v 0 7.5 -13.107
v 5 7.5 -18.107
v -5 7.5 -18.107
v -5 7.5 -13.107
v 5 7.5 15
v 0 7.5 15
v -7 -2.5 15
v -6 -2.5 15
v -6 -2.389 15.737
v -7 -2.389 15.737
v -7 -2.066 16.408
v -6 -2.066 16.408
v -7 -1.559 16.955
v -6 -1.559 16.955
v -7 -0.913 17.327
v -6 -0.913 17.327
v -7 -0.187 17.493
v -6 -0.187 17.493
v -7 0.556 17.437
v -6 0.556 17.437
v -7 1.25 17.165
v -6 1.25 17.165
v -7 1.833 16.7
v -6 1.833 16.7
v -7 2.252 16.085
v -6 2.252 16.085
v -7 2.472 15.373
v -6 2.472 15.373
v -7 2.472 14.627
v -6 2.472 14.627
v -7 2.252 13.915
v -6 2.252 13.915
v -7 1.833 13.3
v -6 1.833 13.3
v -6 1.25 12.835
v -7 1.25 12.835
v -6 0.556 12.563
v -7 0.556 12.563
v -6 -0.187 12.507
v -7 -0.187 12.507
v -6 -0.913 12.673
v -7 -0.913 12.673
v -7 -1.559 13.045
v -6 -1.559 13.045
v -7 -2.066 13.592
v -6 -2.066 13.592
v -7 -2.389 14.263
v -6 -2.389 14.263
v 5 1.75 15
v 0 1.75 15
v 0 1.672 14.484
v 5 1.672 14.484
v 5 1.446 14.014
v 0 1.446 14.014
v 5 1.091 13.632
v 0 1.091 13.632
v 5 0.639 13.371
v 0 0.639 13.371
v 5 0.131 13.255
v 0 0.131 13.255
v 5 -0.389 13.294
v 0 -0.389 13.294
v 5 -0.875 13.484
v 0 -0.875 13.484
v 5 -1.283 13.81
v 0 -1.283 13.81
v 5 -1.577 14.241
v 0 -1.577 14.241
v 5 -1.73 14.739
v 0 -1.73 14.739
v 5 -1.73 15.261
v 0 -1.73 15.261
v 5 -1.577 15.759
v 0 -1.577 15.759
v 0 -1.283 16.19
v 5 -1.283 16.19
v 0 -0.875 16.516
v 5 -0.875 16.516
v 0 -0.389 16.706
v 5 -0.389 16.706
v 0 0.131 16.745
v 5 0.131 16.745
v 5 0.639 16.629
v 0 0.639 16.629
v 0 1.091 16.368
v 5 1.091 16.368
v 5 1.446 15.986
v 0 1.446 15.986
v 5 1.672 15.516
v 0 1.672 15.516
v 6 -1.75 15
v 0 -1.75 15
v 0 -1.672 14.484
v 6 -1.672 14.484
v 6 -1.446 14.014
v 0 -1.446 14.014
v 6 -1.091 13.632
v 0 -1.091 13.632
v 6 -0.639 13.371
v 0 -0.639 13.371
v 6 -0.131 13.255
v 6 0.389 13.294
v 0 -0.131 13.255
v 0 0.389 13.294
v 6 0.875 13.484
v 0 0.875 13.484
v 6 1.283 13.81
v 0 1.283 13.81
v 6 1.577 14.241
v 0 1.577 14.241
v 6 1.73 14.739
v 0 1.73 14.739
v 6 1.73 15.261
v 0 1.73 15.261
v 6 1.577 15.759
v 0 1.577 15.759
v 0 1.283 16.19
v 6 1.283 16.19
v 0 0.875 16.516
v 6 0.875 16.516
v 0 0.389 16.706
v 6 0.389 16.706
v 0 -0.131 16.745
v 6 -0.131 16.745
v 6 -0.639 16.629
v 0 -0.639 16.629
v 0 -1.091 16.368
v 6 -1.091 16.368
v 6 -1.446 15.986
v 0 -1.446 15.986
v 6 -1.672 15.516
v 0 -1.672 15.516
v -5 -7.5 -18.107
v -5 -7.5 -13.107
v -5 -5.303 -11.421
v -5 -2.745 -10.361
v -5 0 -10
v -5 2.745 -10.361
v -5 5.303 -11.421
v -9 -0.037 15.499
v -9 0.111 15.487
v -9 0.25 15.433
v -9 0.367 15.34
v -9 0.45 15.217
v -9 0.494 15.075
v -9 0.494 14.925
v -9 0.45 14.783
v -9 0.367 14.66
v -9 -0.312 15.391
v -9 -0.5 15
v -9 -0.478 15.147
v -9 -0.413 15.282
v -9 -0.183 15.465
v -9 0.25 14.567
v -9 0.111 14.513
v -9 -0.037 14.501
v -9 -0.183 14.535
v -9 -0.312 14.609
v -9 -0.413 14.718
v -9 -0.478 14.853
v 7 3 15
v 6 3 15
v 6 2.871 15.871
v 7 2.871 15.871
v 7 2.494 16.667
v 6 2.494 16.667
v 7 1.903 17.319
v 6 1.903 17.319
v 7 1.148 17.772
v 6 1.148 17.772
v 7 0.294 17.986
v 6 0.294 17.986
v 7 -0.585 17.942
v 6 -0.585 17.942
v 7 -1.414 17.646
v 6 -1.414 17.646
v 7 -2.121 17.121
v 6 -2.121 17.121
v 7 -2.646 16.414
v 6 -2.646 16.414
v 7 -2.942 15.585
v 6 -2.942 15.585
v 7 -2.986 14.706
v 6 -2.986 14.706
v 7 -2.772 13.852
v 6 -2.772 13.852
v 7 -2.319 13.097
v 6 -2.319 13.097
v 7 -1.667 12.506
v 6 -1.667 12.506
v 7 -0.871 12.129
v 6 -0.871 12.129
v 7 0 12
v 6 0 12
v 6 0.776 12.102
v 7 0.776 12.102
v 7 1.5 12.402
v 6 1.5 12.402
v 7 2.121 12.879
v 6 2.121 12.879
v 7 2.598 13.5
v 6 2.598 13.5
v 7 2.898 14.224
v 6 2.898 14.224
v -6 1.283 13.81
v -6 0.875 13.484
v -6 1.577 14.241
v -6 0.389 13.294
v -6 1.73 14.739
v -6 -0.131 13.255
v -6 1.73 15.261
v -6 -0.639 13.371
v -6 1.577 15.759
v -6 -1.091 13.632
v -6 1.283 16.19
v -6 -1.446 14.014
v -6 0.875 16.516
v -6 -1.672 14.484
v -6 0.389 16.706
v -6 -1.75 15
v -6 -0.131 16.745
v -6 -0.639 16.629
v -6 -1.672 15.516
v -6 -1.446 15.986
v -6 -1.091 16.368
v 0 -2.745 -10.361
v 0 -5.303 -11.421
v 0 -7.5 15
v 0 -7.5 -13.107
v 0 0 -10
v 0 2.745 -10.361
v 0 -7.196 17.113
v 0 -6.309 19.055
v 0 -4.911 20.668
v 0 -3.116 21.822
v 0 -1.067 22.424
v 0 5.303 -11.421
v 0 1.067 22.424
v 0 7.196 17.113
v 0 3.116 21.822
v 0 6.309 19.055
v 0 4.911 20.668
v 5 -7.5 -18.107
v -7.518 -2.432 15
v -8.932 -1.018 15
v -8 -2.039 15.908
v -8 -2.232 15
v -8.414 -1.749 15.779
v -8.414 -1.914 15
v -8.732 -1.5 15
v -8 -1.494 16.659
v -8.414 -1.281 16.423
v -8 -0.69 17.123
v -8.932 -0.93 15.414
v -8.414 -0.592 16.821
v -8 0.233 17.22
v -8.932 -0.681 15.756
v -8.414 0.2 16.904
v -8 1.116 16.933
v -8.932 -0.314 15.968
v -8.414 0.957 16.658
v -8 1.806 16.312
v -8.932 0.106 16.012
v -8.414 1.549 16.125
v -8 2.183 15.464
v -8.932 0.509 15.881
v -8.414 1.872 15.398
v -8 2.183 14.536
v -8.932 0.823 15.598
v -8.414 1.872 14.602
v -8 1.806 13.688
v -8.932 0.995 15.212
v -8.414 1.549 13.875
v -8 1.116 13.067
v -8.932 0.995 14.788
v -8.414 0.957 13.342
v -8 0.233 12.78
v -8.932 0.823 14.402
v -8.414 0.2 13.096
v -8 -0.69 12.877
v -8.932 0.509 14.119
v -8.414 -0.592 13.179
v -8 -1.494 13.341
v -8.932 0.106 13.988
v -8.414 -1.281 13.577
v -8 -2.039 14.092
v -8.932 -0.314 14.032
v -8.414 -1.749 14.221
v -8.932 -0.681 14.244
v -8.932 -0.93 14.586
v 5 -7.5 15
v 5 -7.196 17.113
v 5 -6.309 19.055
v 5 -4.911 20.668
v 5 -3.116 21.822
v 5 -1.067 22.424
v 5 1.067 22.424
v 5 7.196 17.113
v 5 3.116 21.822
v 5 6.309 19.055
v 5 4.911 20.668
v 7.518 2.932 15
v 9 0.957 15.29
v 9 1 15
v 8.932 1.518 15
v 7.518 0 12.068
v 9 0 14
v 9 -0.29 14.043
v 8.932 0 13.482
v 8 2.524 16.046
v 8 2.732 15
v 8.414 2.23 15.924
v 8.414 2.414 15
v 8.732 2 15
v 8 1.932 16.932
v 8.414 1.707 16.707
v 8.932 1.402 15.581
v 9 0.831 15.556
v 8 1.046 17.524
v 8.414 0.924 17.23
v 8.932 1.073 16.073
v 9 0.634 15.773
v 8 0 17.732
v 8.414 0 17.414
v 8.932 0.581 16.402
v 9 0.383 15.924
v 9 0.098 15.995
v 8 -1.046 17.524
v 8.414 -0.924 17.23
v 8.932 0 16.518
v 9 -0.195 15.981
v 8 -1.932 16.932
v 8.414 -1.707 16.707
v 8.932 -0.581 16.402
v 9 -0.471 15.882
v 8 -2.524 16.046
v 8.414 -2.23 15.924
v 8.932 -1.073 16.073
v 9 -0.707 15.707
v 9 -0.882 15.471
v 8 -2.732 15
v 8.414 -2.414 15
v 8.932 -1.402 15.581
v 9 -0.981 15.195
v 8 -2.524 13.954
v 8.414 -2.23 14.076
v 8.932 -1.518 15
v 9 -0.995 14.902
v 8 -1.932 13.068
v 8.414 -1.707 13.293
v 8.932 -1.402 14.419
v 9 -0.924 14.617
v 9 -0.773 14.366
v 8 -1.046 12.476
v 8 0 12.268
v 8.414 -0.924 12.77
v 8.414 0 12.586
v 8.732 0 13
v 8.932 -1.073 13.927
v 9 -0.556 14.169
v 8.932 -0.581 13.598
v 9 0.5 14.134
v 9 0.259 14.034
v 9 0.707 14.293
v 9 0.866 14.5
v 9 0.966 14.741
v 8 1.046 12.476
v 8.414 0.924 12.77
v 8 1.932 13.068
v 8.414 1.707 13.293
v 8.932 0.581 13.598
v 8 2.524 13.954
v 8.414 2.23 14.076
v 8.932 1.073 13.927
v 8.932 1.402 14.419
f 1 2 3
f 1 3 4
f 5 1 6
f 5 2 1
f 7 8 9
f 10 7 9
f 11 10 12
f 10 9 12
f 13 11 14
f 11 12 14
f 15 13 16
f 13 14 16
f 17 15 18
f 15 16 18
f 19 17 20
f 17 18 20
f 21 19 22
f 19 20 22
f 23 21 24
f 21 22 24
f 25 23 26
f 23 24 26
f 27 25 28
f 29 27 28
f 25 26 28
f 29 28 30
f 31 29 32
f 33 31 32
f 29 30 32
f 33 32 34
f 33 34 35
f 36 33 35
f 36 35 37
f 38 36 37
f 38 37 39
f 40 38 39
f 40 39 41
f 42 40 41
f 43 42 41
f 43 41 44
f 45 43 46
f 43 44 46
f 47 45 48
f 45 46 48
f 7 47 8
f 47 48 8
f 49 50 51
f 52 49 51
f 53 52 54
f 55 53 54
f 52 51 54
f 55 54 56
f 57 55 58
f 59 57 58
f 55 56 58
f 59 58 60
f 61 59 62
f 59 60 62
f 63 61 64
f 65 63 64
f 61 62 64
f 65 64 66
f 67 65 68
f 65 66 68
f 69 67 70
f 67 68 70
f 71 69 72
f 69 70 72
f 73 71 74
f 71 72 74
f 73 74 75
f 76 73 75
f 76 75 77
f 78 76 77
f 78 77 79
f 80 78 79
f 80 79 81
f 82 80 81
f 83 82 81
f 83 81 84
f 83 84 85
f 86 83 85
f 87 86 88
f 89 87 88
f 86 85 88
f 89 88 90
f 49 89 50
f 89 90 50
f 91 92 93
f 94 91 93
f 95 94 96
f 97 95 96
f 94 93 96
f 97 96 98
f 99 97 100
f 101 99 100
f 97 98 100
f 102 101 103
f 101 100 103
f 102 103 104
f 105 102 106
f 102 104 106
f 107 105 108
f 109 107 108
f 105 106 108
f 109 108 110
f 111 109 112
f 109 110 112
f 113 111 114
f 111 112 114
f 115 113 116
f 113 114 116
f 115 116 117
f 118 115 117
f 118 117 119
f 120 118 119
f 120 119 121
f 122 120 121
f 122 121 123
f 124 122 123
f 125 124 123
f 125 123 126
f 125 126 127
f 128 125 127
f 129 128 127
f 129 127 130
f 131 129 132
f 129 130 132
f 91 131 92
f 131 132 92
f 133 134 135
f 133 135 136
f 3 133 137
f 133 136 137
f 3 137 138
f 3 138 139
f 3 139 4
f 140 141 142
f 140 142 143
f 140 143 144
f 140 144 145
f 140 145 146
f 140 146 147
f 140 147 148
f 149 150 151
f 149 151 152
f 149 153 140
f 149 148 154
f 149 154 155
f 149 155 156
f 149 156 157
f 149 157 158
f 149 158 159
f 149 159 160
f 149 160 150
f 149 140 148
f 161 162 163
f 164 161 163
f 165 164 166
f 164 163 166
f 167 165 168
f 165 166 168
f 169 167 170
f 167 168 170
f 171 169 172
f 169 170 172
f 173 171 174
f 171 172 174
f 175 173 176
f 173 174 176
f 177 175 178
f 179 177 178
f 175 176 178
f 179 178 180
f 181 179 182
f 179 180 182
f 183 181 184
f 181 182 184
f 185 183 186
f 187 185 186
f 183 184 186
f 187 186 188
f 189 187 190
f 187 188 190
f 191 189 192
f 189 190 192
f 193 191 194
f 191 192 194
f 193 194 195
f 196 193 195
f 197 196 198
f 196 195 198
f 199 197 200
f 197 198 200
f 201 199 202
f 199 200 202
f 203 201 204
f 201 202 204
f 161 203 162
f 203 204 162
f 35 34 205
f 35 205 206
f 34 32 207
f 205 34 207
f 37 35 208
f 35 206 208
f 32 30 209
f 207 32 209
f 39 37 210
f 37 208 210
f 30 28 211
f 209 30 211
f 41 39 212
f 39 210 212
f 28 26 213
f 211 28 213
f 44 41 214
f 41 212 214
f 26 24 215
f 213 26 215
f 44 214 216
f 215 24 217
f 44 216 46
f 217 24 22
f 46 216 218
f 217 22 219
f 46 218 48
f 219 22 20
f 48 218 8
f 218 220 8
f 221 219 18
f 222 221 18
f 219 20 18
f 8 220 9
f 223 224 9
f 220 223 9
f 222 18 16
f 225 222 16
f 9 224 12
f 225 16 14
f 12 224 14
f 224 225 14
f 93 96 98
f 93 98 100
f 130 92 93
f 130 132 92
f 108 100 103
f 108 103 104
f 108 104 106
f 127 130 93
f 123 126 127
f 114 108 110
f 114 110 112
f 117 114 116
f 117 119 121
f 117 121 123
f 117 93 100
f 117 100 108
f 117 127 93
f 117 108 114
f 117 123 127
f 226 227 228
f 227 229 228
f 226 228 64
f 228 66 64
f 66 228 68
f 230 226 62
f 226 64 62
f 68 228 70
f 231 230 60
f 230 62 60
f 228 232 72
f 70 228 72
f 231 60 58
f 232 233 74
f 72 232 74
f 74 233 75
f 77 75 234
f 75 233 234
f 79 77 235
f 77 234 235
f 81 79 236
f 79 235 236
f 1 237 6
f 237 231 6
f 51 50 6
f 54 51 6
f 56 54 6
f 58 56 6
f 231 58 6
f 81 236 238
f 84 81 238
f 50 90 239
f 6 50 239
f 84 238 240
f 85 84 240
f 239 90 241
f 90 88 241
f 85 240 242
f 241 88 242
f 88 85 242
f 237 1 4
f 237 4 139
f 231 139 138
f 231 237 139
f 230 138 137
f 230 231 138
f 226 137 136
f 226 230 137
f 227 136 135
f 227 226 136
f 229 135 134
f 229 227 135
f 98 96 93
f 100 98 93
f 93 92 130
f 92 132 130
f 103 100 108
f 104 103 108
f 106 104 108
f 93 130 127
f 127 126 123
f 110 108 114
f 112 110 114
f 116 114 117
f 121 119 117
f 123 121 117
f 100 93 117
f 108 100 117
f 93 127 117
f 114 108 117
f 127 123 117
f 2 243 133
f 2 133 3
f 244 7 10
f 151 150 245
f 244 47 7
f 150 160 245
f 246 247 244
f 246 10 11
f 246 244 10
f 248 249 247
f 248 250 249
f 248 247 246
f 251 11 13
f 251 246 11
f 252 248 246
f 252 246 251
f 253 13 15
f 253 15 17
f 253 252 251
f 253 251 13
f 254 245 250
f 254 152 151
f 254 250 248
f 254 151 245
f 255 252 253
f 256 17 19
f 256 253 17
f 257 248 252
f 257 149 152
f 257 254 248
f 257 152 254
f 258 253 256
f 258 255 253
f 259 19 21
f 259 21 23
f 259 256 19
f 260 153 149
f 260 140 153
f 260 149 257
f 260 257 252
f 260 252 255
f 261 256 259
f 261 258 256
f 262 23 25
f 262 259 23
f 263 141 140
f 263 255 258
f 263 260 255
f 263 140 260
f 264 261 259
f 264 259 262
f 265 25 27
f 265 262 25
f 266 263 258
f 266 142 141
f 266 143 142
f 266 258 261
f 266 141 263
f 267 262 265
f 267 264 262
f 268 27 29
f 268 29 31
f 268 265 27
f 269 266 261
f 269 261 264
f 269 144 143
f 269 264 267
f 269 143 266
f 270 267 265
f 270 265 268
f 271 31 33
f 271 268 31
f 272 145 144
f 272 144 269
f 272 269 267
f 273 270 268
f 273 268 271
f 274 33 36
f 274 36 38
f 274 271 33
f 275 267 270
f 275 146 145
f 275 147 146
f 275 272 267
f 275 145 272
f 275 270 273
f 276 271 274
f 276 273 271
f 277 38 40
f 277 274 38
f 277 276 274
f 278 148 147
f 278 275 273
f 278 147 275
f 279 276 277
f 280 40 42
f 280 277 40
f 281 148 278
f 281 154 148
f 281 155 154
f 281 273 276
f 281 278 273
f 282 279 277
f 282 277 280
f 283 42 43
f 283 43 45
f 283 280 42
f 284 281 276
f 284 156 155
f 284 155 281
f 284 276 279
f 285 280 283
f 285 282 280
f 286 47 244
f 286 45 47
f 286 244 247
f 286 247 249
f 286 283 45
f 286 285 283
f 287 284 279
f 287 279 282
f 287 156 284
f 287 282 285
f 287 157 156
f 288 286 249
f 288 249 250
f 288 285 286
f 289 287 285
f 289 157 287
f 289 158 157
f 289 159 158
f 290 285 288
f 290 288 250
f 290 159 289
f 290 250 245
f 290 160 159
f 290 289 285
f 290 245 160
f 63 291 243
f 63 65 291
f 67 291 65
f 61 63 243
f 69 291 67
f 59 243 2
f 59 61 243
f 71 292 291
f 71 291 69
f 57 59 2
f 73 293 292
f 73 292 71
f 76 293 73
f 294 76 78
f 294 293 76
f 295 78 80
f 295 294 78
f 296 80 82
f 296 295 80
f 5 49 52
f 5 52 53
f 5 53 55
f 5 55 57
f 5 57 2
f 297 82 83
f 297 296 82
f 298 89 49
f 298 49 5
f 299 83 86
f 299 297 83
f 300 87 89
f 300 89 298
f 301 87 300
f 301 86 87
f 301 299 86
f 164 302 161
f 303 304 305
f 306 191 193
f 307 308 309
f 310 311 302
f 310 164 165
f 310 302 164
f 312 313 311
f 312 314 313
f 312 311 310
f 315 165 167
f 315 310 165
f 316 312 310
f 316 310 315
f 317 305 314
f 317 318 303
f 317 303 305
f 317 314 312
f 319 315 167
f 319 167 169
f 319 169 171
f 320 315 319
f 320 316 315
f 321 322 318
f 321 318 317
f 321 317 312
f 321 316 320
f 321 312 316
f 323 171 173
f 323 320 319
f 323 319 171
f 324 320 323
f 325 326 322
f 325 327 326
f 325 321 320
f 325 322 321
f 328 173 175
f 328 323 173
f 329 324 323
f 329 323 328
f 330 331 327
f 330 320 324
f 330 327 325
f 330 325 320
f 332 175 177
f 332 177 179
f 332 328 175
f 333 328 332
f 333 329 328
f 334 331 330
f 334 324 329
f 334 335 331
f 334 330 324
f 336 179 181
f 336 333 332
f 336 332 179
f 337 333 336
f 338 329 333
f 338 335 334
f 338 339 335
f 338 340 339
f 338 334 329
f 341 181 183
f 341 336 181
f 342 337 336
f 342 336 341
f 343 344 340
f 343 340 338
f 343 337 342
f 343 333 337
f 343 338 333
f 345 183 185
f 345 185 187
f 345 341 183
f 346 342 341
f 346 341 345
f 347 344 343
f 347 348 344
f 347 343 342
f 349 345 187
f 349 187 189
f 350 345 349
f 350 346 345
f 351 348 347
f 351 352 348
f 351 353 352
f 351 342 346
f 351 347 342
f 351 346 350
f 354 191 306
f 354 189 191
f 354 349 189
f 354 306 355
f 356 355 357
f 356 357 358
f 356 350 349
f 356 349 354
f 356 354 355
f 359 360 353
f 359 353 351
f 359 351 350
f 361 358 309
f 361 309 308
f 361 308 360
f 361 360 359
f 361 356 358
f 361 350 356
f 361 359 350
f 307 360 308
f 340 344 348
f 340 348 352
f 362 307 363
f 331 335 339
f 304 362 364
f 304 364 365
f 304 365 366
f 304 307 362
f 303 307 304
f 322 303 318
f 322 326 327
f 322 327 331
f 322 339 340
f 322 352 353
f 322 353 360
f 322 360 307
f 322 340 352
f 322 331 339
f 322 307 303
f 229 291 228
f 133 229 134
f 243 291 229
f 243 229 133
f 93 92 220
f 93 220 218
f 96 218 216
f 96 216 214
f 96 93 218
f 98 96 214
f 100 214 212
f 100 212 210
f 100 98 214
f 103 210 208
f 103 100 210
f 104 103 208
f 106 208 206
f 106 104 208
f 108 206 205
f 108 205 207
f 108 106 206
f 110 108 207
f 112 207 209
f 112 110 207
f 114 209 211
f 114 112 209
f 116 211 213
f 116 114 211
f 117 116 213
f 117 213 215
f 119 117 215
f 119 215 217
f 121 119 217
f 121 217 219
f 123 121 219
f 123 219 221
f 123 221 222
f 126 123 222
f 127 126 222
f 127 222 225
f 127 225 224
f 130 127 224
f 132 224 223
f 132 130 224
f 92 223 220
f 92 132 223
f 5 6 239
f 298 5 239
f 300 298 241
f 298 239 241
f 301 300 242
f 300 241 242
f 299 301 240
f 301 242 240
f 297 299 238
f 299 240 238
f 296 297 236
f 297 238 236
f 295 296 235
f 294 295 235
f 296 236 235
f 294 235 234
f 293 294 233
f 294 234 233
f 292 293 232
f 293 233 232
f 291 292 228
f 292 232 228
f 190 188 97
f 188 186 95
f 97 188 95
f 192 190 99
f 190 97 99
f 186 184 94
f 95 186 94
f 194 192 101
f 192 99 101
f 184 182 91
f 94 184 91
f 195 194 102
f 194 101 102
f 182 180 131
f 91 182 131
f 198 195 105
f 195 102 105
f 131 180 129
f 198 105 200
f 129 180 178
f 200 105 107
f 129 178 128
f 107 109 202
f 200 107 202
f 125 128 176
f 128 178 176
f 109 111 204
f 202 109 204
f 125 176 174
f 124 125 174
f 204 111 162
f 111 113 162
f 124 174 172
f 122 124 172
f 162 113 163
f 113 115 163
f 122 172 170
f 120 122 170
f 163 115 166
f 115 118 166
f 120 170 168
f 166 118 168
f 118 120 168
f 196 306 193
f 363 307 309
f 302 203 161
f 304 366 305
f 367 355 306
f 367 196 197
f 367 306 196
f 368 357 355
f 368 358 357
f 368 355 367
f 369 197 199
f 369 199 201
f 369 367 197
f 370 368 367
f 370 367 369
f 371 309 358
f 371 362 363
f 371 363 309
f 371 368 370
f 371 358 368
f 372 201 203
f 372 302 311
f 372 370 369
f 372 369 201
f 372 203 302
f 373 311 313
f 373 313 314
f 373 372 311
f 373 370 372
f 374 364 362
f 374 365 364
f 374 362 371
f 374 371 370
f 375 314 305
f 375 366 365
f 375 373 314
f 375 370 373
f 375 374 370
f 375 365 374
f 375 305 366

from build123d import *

# Parameters (mm, degrees)
F1_DEPTH = 5
F2_DEPTH = 5
F3_DEPTH = 6
F5_DEPTH = 3
F6_R     = 2
F7_DEPTH = 6
F8_R     = 2.5
F9_DEPTH = 3
F10_R    = 2


# Not quite as in the source:
# - a feature names something its author has since deleted; it is built from what else it names
# - the program builds the solid bodies; features that only make, move or delete a surface that nothing else refers to are left out


with BuildPart() as f1:
    # F0 (on Right) → F1 (new body)
    with BuildSketch(Plane.YZ):
        with BuildLine():
            ThreePointArc((7.5, 15), (0, 22.5), (-7.5, 15))
            Line((-7.5, 15), (-2, 15))
            ThreePointArc((-2, 15), (0, 17), (2, 15))
            Line((2, 15), (7.5, 15))
        make_face()
        with BuildLine():
            ThreePointArc((2, 15), (0, 17), (-2, 15))
            Line((-2, 15), (-1.95, 15))
            ThreePointArc((-1.95, 15), (0, 16.95), (1.95, 15))
            Line((1.95, 15), (2, 15))
        make_face()
        with BuildLine():
            ThreePointArc((1.95, 15), (0, 16.95), (-1.95, 15))
            Line((-1.95, 15), (-1.75, 15))
            ThreePointArc((-1.75, 15), (0, 16.75), (1.75, 15))
            Line((1.75, 15), (1.95, 15))
        make_face()
        with BuildLine():
            Line((-7.5, 15), (-7.5, -5.6289238692))
            ThreePointArc((-7.5, -5.6289238692), (0, -6.95), (7.5, -5.6289238692))
            Line((7.5, -5.6289238692), (7.5, 15))
            Line((7.5, 15), (2, 15))
            ThreePointArc((2, 15), (0, 13), (-2, 15))
            Line((-2, 15), (-7.5, 15))
        make_face()
        with BuildLine():
            Line((-1.95, 15), (-2, 15))
            ThreePointArc((-2, 15), (0, 13), (2, 15))
            Line((2, 15), (1.95, 15))
            ThreePointArc((1.95, 15), (0, 13.05), (-1.95, 15))
        make_face()
        with BuildLine():
            Line((-1.75, 15), (-1.95, 15))
            ThreePointArc((-1.95, 15), (0, 13.05), (1.95, 15))
            Line((1.95, 15), (1.75, 15))
            ThreePointArc((1.75, 15), (0, 13.25), (-1.75, 15))
        make_face()
        with BuildLine():
            Line((-7.5, -5.6289238692), (-7.5, -13.1065604925))
            ThreePointArc((-7.5, -13.1065604925), (0, -10), (7.5, -13.1065604925))
            Line((7.5, -13.1065604925), (7.5, -5.6289238692))
            ThreePointArc((7.5, -5.6289238692), (0, -6.95), (-7.5, -5.6289238692))
        make_face()
        with BuildLine():
            Line((-7.5, -13.1065604925), (-7.5, -18.1065604925))
            Line((-7.5, -18.1065604925), (7.5, -18.1065604925))
            Line((7.5, -18.1065604925), (7.5, -13.1065604925))
            ThreePointArc((7.5, -13.1065604925), (0, -10), (-7.5, -13.1065604925))
        make_face()
    extrude(amount=F1_DEPTH)

    # F0 (on Right) → F2 (join)
    with BuildSketch(Plane.YZ):
        with BuildLine():
            Line((-7.5, -13.1065604925), (-7.5, -18.1065604925))
            Line((-7.5, -18.1065604925), (7.5, -18.1065604925))
            Line((7.5, -18.1065604925), (7.5, -13.1065604925))
            ThreePointArc((7.5, -13.1065604925), (0, -10), (-7.5, -13.1065604925))
        make_face()
    extrude(amount=-F2_DEPTH)


with BuildPart() as f3:
    # F0 (on Right) → F3 (new body)
    with BuildSketch(Plane.YZ):
        with BuildLine():
            ThreePointArc((1.75, 15), (0, 16.75), (-1.75, 15))
            Line((-1.75, 15), (1.75, 15))
        make_face()
        with BuildLine():
            Line((1.75, 15), (-1.75, 15))
            ThreePointArc((-1.75, 15), (0, 13.25), (1.75, 15))
        make_face()
    extrude(amount=F3_DEPTH)

    # F4 (on face) → F5 (join)
    with BuildSketch(Plane.YZ.offset(6)):
        with BuildLine():
            ThreePointArc((0, 12), (2.1213203436, 12.8786796564), (3, 15))
            ThreePointArc((3, 15), (-2.1213203436, 17.1213203436), (0, 12))
        make_face()
    extrude(amount=F5_DEPTH)

    # F6
    f6_edges = [f3.edges().sort_by_distance(p)[0] for p in [
        (9, 0, 18),
    ]]
    fillet(f6_edges, radius=F6_R)


with BuildPart() as f7:
    # F0 (on Right) → F7 (new body)
    with BuildSketch(Plane.YZ):
        with BuildLine():
            ThreePointArc((1.75, 15), (0, 16.75), (-1.75, 15))
            Line((-1.75, 15), (1.75, 15))
        make_face()
        with BuildLine():
            Line((1.75, 15), (-1.75, 15))
            ThreePointArc((-1.75, 15), (0, 13.25), (1.75, 15))
        make_face()
    extrude(amount=-F7_DEPTH)

    # F8 (on face) → F9 (join)
    with BuildSketch(Plane(origin=(-6, 0, 0), x_dir=(0, -1, 0), z_dir=(-1, 0, 0))):
        with Locations((0, 15)):
            Circle(F8_R)
    extrude(amount=F9_DEPTH)

    # F10
    f10_edges = [f7.edges().sort_by_distance(p)[0] for p in [
        (-9, 2.5, 15),
    ]]
    fillet(f10_edges, radius=F10_R)


solid = Compound([f1.part, f3.part, f7.part])
